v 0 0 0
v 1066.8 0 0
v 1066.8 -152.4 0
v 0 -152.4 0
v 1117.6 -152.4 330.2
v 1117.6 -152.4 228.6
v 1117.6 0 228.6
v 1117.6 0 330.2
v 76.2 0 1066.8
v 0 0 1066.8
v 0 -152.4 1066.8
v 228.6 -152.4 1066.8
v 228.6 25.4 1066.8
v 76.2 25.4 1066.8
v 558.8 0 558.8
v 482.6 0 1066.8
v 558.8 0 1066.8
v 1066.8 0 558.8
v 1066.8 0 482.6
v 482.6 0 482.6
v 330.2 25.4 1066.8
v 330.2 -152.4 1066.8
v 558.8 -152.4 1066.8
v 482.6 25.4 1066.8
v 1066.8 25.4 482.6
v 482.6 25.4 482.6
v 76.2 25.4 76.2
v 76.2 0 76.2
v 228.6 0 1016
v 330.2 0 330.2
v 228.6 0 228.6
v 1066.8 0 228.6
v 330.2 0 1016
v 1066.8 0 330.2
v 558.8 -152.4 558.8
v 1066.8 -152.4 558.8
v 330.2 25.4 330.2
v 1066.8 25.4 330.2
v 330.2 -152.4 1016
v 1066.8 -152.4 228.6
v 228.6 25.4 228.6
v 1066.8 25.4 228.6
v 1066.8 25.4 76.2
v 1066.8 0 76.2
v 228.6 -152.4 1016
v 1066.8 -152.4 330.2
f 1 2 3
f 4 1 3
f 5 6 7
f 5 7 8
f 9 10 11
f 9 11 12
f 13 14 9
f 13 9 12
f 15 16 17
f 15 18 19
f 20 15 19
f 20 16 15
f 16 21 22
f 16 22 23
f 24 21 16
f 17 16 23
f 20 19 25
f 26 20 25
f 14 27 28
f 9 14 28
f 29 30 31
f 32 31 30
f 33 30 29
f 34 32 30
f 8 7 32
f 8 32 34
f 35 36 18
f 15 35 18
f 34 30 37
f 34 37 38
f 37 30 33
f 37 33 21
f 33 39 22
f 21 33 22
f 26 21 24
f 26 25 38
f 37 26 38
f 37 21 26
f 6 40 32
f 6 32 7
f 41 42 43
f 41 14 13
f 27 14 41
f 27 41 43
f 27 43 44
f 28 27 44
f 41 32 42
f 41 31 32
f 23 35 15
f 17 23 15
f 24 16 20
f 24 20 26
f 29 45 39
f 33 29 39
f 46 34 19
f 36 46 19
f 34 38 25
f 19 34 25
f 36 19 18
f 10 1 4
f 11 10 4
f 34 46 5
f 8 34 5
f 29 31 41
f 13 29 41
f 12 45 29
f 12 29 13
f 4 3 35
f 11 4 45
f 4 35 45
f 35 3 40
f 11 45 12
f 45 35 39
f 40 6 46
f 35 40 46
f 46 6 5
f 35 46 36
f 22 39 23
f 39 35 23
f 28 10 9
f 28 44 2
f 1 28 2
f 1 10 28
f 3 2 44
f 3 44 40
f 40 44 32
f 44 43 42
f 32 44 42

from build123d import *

# Parameters (mm, degrees)
F1_DEPTH  = 1066.8
F3_W      = 101.6
F3_H      = 50.8
F4_DEPTH  = 152.4
F5_W      = 101.6
F5_H      = 50.8
F6_DEPTH  = 177.801
F8_DEPTH  = 177.801
F10_W     = 101.6
F10_H     = 101.6
F11_DEPTH = 177.801


with BuildPart() as f1:
    # F0 (on Top) → F1 (new body)
    with BuildSketch(Plane.XY):
        Polygon((76.2, 0), (0, 0), (0, -152.4), (558.8, -152.4), (558.8, 0), (482.6, 0), (482.6, 25.4), (330.2, 25.4), (330.2, 0), (228.6, 0), (228.6, 25.4), (76.2, 25.4), align=None)
    extrude(amount=F1_DEPTH)

    # F3 (on offset) → F4 (join)
    with BuildSketch(Plane.XZ.offset(152.4)):
        with Locations((279.4, 1092.2)):
            Rectangle(F3_W, F3_H)
    extrude(amount=-F4_DEPTH)

    # F5 (on offset) → F6 (cut, through all)
    with BuildSketch(Plane.XZ.offset(152.4)):
        with Locations((279.4, 25.4)):
            Rectangle(F5_W, F5_H)
    extrude(amount=-F6_DEPTH, mode=Mode.SUBTRACT)

    # F7 (on offset) → F8 (cut, through all)
    with BuildSketch(Plane.XZ.offset(152.4)):
        Polygon((586.1058764434, 586.1058764434), (0, 0), (586.1058764434, 0), align=None)
    extrude(amount=-F8_DEPTH, mode=Mode.SUBTRACT)

    # F9: F1 across face


with BuildPart() as f1_1:
    add(f1.part)
    add(f1.part.mirror(Plane(origin=(279.4, -68.7916666667, 279.4), x_dir=(0, 1, 0), z_dir=(0.7071067812, 0, -0.7071067812))))

    # F10 (on offset) → F11 (cut, through all)
    with BuildSketch(Plane.XZ.offset(152.4)):
        with Locations((279.4, 1066.8)):
            Rectangle(F10_W, F10_H)
    extrude(amount=-F11_DEPTH, mode=Mode.SUBTRACT)


solid = f1_1.part
